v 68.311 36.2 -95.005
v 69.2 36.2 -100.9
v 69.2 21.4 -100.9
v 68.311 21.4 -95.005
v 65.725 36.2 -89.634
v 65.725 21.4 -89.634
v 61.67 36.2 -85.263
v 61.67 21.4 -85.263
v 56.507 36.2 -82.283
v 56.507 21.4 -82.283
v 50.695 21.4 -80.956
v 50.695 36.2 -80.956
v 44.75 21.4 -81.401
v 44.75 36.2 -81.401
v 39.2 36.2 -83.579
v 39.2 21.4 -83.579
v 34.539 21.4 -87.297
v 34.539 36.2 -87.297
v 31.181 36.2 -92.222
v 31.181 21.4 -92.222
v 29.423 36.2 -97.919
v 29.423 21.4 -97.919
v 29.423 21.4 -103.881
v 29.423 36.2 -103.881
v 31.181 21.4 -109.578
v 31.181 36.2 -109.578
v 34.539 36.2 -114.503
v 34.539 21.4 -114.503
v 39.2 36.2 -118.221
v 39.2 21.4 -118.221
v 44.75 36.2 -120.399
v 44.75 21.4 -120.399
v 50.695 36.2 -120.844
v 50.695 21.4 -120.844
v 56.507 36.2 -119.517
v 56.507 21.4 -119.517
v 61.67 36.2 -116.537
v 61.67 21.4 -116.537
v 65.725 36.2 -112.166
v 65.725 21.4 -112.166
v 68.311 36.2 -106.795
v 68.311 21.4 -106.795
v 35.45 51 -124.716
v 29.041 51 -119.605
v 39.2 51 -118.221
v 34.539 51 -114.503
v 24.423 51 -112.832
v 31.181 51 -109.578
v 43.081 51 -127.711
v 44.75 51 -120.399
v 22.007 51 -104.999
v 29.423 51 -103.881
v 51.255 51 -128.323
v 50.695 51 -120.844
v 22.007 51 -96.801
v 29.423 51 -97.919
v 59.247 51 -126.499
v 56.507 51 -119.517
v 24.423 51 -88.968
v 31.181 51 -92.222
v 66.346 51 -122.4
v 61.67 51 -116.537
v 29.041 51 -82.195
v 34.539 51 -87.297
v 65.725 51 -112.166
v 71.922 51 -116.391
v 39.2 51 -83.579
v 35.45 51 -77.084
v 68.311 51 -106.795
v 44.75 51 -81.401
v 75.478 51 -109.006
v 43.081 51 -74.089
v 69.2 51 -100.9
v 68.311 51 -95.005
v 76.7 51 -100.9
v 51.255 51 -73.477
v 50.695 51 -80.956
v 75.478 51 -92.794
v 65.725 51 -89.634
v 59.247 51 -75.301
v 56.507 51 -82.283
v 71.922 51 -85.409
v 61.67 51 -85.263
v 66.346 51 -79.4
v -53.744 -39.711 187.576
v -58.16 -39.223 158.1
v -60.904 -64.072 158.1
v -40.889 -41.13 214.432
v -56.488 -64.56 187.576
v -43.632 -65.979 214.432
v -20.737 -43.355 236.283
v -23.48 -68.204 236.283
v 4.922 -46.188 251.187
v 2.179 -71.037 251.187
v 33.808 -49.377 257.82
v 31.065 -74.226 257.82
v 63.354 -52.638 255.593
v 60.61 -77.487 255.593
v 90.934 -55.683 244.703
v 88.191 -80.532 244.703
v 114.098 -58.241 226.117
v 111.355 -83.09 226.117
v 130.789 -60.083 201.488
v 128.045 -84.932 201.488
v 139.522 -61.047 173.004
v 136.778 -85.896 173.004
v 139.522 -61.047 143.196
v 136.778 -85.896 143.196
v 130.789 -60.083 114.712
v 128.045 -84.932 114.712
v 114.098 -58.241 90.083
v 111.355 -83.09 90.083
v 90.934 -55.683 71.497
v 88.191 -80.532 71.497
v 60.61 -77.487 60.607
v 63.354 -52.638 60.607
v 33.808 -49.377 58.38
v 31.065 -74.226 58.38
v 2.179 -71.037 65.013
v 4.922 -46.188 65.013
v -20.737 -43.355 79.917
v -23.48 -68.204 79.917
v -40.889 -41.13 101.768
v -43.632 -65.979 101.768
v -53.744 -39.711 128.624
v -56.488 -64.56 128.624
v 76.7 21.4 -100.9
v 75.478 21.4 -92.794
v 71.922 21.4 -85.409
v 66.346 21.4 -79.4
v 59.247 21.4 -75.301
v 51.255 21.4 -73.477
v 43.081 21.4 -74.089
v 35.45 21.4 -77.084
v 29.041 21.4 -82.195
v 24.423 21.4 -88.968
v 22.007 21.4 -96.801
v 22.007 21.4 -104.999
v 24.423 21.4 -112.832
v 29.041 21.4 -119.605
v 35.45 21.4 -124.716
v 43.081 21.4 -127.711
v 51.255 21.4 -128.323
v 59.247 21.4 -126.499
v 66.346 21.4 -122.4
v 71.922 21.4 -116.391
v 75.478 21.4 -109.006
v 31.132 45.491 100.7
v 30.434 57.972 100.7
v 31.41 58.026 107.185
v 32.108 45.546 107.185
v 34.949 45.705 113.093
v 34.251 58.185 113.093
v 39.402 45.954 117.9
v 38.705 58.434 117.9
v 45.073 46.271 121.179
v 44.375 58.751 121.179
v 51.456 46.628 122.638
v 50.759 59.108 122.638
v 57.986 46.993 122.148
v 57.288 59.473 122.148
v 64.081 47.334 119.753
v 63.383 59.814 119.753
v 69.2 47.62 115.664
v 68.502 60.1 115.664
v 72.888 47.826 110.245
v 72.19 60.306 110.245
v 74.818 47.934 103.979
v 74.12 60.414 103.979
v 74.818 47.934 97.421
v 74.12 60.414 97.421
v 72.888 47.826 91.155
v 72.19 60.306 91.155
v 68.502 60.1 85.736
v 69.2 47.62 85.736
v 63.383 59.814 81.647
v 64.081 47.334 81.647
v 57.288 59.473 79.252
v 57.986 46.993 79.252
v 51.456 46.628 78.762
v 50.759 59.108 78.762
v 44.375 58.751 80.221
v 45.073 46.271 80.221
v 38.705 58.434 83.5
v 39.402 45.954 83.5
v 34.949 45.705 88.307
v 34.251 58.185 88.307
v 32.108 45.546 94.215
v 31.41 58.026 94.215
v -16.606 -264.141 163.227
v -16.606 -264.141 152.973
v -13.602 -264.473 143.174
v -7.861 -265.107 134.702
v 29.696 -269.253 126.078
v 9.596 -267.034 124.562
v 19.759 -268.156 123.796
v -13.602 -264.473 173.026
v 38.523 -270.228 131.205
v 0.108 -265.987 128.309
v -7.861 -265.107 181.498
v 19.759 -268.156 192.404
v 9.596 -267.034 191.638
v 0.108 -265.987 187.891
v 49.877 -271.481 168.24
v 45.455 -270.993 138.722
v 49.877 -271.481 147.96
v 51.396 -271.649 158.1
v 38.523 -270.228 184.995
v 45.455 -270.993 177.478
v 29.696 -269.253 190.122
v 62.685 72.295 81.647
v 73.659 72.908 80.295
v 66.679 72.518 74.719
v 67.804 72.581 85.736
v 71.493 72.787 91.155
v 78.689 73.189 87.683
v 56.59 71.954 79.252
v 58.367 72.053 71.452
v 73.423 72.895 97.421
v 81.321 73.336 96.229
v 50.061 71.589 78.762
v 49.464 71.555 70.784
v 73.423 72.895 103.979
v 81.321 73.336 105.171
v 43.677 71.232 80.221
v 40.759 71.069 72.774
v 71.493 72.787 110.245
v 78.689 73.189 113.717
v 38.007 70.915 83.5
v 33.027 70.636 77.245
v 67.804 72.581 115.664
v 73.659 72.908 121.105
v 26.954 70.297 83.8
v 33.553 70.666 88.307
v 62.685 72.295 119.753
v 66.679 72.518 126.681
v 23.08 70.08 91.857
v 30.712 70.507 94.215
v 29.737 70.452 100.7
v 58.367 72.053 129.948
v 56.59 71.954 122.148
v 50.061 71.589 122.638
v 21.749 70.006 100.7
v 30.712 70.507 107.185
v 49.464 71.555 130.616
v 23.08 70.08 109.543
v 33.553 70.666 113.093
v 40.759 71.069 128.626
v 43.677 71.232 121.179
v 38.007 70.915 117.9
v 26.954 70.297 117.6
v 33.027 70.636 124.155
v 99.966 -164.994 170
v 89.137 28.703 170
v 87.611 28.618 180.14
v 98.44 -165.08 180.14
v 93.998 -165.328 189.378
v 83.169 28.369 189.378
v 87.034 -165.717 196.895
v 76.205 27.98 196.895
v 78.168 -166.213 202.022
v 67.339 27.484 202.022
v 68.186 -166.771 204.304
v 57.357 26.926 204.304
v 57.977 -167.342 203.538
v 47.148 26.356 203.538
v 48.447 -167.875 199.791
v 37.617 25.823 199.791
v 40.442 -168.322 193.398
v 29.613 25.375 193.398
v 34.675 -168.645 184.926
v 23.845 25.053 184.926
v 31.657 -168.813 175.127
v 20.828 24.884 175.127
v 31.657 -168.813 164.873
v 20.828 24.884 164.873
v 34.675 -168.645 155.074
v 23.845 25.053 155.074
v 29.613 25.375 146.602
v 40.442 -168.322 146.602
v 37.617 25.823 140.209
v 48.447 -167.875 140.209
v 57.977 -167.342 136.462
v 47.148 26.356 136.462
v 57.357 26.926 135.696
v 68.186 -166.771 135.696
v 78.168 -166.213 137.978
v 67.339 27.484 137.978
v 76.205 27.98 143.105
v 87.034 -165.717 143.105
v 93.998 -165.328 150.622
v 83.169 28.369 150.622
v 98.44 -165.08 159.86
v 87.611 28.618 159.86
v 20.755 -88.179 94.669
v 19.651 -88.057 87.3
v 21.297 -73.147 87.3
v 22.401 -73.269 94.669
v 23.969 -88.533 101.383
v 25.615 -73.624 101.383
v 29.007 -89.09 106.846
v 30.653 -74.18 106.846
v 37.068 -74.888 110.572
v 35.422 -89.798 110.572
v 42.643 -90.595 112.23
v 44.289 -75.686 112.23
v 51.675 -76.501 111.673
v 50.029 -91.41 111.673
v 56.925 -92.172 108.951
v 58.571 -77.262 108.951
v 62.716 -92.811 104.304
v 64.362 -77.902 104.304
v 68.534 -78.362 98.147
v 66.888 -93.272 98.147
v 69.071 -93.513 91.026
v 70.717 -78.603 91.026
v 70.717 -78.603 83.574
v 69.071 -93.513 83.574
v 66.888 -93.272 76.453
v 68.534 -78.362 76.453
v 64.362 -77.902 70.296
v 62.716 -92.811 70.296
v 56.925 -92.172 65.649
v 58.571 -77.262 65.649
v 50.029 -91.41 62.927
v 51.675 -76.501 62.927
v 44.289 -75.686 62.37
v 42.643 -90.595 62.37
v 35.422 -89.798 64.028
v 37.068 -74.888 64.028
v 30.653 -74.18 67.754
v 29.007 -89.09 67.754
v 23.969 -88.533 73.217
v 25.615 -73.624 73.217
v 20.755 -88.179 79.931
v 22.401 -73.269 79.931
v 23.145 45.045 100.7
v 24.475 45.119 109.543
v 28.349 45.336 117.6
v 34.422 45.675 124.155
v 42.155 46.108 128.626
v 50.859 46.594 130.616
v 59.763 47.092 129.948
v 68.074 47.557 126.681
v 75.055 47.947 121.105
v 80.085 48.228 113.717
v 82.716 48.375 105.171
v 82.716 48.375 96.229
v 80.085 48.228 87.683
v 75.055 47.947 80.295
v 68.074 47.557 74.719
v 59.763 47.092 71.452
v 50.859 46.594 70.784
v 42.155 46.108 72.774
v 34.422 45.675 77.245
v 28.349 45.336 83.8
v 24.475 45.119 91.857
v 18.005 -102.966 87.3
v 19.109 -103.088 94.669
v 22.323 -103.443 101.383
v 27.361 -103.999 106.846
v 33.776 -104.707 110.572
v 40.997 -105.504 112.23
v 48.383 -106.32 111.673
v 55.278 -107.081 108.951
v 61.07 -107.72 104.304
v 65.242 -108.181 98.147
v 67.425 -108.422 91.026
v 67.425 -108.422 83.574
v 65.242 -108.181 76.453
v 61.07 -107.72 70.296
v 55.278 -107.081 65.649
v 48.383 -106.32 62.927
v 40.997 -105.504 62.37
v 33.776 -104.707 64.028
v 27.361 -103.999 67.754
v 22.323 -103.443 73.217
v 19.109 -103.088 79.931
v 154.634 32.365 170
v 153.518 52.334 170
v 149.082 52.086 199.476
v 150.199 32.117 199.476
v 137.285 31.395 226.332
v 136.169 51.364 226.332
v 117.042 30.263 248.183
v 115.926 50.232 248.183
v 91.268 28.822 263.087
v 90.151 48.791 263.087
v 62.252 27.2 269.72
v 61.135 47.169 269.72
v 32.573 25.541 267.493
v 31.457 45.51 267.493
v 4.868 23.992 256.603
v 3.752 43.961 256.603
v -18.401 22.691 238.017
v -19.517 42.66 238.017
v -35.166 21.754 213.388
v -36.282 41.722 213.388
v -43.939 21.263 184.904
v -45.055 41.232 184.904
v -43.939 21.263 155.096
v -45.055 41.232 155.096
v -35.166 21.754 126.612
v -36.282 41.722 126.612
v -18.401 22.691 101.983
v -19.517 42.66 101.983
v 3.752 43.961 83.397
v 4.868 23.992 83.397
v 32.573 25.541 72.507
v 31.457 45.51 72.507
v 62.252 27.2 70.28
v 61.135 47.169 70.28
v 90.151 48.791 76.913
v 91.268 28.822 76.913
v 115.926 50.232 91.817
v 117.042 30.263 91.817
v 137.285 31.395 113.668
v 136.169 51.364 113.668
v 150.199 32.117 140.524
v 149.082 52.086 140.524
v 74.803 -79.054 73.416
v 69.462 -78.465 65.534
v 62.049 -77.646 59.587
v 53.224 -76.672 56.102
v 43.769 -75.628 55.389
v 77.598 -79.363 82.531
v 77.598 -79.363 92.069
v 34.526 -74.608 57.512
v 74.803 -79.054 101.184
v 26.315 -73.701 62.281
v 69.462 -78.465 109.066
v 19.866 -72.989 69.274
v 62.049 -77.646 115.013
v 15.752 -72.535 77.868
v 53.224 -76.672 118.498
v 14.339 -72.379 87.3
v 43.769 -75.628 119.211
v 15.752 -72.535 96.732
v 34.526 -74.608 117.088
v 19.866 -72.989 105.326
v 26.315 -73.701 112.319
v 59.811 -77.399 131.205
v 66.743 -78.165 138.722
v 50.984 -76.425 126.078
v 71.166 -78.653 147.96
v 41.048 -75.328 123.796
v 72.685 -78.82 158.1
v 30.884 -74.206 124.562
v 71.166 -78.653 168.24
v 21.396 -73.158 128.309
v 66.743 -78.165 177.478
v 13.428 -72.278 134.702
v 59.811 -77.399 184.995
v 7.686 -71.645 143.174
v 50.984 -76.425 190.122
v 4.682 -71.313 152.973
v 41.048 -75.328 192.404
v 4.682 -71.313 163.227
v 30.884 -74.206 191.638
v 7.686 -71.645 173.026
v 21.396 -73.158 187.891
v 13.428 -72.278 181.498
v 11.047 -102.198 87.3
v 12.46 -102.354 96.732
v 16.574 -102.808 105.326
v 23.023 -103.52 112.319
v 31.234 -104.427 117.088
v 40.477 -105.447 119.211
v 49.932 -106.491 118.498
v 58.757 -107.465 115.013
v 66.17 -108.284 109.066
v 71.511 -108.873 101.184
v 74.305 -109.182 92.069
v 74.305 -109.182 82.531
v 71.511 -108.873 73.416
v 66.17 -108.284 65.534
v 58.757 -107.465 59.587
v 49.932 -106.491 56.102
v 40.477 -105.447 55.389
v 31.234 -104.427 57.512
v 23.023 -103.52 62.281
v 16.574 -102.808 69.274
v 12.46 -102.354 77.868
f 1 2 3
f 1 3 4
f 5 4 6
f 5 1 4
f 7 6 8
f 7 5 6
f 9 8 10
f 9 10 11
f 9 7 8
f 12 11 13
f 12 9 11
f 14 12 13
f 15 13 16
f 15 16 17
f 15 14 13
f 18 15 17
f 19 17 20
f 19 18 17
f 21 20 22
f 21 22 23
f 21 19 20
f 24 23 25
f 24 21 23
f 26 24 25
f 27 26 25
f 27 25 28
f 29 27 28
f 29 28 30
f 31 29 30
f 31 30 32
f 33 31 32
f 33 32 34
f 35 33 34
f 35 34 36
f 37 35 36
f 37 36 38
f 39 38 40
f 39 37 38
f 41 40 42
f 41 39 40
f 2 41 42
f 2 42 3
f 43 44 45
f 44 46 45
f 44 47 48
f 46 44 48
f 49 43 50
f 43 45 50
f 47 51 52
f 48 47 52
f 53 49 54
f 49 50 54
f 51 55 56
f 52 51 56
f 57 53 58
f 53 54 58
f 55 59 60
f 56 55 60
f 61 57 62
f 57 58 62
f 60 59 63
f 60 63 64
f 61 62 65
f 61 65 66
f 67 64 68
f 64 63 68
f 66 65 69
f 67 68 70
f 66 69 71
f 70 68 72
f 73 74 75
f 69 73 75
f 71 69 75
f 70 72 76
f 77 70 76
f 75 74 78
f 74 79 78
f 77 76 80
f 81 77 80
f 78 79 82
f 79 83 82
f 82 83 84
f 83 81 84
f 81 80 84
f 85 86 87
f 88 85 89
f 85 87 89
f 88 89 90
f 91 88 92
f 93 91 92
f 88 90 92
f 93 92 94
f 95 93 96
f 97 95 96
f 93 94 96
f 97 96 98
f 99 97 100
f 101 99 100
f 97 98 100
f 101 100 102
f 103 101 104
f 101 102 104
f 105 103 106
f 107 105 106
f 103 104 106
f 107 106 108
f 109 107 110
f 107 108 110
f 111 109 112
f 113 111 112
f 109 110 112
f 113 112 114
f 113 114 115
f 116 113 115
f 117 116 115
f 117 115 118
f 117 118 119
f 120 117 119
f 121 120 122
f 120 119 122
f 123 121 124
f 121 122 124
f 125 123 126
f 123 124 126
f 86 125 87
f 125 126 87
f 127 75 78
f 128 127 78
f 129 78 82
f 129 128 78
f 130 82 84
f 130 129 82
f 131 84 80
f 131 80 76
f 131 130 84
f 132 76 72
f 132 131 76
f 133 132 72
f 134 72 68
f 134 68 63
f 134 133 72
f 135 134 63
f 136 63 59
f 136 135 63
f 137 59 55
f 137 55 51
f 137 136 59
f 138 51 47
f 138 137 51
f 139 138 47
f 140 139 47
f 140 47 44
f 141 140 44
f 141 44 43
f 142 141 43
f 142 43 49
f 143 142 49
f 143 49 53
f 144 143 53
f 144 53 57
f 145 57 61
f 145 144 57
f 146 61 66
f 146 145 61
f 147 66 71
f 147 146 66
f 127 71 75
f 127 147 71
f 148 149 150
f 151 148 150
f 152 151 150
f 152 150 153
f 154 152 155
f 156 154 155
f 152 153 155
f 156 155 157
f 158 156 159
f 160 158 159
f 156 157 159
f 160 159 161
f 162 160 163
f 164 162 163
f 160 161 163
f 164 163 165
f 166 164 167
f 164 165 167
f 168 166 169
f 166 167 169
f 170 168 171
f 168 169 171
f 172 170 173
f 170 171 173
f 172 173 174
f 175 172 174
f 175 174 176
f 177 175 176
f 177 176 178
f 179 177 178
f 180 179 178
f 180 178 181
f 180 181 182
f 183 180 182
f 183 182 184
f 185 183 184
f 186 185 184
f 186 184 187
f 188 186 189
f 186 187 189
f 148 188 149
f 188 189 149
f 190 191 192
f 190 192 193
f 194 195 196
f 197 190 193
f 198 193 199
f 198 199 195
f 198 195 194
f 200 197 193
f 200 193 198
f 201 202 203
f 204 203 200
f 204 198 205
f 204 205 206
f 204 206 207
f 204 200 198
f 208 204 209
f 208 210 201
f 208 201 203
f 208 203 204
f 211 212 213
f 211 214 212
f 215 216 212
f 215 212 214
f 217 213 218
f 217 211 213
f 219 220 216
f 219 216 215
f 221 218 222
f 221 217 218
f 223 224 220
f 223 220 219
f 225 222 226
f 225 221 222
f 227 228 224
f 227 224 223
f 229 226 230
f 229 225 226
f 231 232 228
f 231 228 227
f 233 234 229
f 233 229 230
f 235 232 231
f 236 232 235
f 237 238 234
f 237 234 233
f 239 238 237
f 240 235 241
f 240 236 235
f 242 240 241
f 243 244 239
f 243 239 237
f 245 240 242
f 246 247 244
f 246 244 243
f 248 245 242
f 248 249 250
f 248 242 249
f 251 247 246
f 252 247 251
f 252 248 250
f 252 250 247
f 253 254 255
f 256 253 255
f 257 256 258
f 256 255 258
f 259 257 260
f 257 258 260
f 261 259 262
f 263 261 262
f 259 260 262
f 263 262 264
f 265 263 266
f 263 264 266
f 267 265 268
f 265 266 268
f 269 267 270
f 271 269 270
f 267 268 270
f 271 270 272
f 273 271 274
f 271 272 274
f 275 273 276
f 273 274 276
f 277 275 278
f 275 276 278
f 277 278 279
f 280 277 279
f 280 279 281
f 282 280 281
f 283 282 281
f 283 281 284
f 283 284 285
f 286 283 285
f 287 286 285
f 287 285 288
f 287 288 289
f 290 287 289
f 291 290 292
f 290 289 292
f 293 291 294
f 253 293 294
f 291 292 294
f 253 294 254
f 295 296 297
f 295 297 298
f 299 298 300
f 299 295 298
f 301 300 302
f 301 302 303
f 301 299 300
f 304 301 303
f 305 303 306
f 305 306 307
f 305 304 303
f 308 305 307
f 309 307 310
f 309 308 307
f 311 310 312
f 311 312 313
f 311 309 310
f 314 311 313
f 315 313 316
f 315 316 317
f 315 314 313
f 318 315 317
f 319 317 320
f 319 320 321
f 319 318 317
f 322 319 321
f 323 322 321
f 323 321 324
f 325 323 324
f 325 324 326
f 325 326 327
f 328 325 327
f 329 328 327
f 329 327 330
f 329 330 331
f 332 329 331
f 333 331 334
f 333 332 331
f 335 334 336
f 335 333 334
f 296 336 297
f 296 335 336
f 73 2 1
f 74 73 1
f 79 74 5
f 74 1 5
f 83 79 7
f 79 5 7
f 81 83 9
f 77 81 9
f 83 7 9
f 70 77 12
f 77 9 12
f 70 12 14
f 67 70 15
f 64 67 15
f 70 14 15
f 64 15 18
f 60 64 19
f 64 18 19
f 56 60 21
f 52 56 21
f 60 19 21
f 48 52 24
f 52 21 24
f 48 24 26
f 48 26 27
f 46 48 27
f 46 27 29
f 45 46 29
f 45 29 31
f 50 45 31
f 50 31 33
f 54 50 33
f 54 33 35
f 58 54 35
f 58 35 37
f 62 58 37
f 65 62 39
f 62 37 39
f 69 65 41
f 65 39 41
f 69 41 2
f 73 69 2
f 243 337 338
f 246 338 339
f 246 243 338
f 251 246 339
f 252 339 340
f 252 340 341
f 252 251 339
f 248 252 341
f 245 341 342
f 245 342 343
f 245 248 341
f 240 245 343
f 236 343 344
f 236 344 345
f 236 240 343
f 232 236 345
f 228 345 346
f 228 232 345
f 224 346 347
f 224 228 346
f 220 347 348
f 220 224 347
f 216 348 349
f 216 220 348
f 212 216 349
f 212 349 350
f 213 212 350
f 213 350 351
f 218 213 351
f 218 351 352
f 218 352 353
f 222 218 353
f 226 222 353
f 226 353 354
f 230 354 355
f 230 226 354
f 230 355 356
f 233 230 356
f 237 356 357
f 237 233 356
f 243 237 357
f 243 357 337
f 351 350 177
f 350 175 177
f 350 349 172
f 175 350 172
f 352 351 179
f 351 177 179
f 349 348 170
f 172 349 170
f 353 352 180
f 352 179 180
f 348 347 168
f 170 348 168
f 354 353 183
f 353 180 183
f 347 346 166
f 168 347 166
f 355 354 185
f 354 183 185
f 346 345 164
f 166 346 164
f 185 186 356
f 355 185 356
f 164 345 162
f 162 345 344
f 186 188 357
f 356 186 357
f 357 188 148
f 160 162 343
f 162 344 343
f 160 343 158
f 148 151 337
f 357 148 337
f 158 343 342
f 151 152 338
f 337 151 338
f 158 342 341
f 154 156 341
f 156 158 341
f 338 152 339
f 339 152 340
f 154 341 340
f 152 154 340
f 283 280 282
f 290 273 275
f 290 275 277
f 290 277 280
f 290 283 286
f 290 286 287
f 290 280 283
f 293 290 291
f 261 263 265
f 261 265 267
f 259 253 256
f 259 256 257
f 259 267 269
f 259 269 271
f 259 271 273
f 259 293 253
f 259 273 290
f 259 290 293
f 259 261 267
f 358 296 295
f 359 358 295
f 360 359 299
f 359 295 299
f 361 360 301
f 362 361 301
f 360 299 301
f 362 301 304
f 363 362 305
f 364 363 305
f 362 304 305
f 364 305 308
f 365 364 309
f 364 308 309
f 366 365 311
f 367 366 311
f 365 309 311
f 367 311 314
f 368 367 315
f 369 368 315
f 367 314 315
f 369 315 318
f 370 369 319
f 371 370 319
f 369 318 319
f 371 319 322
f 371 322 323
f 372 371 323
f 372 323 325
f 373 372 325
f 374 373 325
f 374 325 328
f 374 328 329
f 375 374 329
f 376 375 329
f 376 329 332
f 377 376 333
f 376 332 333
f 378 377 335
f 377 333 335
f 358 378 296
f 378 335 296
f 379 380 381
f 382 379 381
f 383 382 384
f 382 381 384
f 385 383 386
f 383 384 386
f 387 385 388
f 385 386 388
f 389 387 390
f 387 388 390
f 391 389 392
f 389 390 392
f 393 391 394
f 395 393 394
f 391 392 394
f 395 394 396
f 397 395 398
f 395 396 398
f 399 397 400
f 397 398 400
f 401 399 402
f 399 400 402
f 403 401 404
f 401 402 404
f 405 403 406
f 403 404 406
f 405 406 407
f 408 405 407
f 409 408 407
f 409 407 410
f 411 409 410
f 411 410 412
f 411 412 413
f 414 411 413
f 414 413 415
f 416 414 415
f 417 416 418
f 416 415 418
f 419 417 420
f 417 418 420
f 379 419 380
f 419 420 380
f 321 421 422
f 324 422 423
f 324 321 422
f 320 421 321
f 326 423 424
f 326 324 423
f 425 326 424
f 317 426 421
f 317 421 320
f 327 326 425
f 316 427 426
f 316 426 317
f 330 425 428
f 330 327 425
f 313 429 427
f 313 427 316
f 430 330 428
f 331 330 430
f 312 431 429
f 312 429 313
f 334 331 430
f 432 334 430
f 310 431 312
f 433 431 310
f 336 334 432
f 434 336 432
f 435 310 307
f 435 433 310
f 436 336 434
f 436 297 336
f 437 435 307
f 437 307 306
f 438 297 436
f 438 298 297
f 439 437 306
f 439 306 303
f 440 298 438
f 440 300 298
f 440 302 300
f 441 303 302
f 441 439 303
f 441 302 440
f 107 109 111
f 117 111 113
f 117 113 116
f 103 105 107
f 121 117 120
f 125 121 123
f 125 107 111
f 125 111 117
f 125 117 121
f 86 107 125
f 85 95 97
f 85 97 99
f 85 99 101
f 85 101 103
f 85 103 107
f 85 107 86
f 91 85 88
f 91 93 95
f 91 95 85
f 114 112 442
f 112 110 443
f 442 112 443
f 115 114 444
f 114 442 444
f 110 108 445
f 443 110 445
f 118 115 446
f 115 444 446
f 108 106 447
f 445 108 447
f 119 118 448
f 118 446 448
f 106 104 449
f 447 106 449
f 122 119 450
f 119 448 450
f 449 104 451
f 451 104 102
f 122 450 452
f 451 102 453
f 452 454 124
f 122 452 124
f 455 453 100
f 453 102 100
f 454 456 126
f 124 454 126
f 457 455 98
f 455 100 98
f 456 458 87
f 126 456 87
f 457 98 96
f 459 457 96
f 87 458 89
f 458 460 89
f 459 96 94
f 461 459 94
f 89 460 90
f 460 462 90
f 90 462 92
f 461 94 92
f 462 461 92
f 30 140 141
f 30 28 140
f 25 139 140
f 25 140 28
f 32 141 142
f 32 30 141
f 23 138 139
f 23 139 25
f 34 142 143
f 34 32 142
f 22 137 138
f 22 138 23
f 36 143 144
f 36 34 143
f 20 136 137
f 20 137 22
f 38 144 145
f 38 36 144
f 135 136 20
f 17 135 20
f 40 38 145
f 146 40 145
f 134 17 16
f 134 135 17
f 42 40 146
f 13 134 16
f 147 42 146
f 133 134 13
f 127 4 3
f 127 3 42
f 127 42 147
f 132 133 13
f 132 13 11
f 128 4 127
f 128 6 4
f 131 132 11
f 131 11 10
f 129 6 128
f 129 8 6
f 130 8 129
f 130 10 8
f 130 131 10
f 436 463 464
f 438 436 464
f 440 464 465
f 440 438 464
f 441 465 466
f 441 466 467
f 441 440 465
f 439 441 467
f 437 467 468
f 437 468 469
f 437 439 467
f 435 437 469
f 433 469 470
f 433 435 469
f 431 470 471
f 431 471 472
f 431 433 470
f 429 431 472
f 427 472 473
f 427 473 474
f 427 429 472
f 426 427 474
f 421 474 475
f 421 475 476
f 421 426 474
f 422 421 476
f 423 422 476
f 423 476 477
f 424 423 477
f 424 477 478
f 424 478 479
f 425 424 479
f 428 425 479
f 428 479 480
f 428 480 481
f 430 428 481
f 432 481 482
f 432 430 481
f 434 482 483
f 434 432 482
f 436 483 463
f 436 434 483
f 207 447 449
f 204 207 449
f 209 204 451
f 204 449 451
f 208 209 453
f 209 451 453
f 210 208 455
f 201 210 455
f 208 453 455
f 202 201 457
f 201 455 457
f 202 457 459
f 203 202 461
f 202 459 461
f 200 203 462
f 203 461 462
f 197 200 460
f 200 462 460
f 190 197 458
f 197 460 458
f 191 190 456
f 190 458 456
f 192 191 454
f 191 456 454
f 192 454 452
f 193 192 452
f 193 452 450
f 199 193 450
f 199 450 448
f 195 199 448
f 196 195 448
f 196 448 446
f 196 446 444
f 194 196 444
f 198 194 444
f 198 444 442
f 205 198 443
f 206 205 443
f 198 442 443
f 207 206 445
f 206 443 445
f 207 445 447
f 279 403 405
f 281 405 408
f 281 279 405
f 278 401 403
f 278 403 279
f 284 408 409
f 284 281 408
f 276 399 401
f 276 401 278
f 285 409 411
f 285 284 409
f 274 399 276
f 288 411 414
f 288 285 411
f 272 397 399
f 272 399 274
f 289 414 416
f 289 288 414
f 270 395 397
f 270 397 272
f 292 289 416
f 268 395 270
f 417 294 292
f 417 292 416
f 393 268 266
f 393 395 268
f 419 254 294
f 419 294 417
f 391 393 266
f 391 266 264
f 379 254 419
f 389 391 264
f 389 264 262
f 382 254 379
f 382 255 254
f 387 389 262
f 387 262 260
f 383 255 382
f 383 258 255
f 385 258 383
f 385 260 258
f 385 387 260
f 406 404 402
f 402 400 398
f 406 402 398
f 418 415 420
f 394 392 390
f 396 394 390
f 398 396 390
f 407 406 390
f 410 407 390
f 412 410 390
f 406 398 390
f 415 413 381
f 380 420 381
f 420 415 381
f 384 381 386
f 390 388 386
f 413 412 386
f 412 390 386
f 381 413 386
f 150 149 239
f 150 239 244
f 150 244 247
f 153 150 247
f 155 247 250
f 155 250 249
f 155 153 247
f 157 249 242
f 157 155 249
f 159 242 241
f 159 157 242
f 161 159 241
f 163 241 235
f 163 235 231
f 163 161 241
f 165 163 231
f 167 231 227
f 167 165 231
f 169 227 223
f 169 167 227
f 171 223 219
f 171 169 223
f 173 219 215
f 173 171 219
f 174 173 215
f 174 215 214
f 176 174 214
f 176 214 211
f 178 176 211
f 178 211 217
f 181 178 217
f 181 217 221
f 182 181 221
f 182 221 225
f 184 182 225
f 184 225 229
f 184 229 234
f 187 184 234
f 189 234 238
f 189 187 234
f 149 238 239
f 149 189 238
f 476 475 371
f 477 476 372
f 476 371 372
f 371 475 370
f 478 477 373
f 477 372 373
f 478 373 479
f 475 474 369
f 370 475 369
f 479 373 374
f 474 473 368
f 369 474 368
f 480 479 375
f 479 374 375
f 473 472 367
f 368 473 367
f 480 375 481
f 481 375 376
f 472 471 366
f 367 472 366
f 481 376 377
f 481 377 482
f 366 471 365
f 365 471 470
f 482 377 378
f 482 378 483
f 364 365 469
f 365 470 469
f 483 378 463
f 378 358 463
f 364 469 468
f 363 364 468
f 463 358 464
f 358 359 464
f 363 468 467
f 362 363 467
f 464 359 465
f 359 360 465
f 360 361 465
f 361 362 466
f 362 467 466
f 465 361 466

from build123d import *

# Parameters (mm, degrees)
F2_R           = 27.5
F2_R_2         = 20
F3_DEPTH       = 14.8
F3_DEPTH_BACK  = 14.8
F7_R           = 30
F7_R_2         = 22
F8_DEPTH       = 12.5
F8_DEPTH_BACK  = 12.5
F12_R          = 32
F12_R_2        = 25
F13_DEPTH      = 15
F13_DEPTH_BACK = 15
F14_R          = 100
F15_DEPTH      = 20
F16_R          = 34.4
F17_DEPTH      = 194
F18_R          = 100
F19_DEPTH      = 25
F20_R          = 34.4
F21_DEPTH      = 194


with BuildPart() as f3:
    # F2 (on offset) → F3 (new body, two sides)
    with BuildSketch(Plane.XZ.offset(-36.2)) as f3_sk:
        with Locations((49.2, -100.9)):
            Circle(F2_R)
        with Locations((49.2, -100.9)):
            Circle(F2_R_2, mode=Mode.SUBTRACT)
    extrude(amount=F3_DEPTH)
    extrude(f3_sk.sketch, amount=-F3_DEPTH_BACK)


with BuildPart() as f8:
    # F7 (on face) → F8 (new body, two sides)
    with BuildSketch(Plane(origin=(-3.1361998753, 56.0950443833, 0), x_dir=(-0.9984407642, -0.055821505, 0), z_dir=(-0.055821505, 0.9984407642, 0))) as f8_sk:
        with Locations((-55.6229291387, 100.7)):
            Circle(F7_R)
        with Locations((-55.6229291387, 100.7)):
            Circle(F7_R_2, mode=Mode.SUBTRACT)
    extrude(amount=F8_DEPTH)
    extrude(f8_sk.sketch, amount=-F8_DEPTH_BACK)


with BuildPart() as f13:
    # F12 (on face) → F13 (new body, two sides)
    with BuildSketch(Plane(origin=(-9.3678511125, -84.8529338709, 0), x_dir=(-0.9939609555, 0.1097343111, 0), z_dir=(0.1097343111, 0.9939609555, 0))) as f13_sk:
        with Locations((-54.1951379648, 87.3)):
            Circle(F12_R)
        with Locations((-54.1951379648, 87.3)):
            Circle(F12_R_2, mode=Mode.SUBTRACT)
    extrude(amount=F13_DEPTH)
    extrude(f13_sk.sketch, amount=-F13_DEPTH_BACK)


with BuildPart() as f15:
    # F14 (on face) → F15 (new body)
    with BuildSketch(Plane(origin=(-2.4384310629, 43.6145348311, 0), x_dir=(0.9984407642, 0.055821505, 0), z_dir=(0.055821505, -0.9984407642, 0))):
        with Locations((56.2, 170)):
            Circle(F14_R)
    extrude(amount=F15_DEPTH)

    # F16 (on face) → F17 (join)
    with BuildSketch(Plane(origin=(-1.322000963, 23.6457195474, 0), x_dir=(0.9984407642, 0.055821505, 0), z_dir=(0.055821505, -0.9984407642, 0))):
        with Locations((56.2, 170)):
            Circle(F16_R)
    extrude(amount=F17_DEPTH)


with BuildPart() as f19:
    # F18 (on face) → F19 (new body)
    with BuildSketch(Plane(origin=(-7.7218364462, -69.9435195391, 0), x_dir=(-0.9939609555, 0.1097343111, 0), z_dir=(0.1097343111, 0.9939609555, 0))):
        with Locations((-46.4951379648, 158.1)):
            Circle(F18_R)
    extrude(amount=F19_DEPTH)

    # F20 (on face) → F21 (join)
    with BuildSketch(Plane(origin=(-7.7218364462, -69.9435195391, 0), x_dir=(0.9939609555, -0.1097343111, 0), z_dir=(-0.1097343111, -0.9939609555, 0))):
        with Locations((46.4951379648, 158.1)):
            Circle(F20_R)
    extrude(amount=F21_DEPTH)


solid = Compound([f3.part, f8.part, f13.part, f15.part, f19.part])
